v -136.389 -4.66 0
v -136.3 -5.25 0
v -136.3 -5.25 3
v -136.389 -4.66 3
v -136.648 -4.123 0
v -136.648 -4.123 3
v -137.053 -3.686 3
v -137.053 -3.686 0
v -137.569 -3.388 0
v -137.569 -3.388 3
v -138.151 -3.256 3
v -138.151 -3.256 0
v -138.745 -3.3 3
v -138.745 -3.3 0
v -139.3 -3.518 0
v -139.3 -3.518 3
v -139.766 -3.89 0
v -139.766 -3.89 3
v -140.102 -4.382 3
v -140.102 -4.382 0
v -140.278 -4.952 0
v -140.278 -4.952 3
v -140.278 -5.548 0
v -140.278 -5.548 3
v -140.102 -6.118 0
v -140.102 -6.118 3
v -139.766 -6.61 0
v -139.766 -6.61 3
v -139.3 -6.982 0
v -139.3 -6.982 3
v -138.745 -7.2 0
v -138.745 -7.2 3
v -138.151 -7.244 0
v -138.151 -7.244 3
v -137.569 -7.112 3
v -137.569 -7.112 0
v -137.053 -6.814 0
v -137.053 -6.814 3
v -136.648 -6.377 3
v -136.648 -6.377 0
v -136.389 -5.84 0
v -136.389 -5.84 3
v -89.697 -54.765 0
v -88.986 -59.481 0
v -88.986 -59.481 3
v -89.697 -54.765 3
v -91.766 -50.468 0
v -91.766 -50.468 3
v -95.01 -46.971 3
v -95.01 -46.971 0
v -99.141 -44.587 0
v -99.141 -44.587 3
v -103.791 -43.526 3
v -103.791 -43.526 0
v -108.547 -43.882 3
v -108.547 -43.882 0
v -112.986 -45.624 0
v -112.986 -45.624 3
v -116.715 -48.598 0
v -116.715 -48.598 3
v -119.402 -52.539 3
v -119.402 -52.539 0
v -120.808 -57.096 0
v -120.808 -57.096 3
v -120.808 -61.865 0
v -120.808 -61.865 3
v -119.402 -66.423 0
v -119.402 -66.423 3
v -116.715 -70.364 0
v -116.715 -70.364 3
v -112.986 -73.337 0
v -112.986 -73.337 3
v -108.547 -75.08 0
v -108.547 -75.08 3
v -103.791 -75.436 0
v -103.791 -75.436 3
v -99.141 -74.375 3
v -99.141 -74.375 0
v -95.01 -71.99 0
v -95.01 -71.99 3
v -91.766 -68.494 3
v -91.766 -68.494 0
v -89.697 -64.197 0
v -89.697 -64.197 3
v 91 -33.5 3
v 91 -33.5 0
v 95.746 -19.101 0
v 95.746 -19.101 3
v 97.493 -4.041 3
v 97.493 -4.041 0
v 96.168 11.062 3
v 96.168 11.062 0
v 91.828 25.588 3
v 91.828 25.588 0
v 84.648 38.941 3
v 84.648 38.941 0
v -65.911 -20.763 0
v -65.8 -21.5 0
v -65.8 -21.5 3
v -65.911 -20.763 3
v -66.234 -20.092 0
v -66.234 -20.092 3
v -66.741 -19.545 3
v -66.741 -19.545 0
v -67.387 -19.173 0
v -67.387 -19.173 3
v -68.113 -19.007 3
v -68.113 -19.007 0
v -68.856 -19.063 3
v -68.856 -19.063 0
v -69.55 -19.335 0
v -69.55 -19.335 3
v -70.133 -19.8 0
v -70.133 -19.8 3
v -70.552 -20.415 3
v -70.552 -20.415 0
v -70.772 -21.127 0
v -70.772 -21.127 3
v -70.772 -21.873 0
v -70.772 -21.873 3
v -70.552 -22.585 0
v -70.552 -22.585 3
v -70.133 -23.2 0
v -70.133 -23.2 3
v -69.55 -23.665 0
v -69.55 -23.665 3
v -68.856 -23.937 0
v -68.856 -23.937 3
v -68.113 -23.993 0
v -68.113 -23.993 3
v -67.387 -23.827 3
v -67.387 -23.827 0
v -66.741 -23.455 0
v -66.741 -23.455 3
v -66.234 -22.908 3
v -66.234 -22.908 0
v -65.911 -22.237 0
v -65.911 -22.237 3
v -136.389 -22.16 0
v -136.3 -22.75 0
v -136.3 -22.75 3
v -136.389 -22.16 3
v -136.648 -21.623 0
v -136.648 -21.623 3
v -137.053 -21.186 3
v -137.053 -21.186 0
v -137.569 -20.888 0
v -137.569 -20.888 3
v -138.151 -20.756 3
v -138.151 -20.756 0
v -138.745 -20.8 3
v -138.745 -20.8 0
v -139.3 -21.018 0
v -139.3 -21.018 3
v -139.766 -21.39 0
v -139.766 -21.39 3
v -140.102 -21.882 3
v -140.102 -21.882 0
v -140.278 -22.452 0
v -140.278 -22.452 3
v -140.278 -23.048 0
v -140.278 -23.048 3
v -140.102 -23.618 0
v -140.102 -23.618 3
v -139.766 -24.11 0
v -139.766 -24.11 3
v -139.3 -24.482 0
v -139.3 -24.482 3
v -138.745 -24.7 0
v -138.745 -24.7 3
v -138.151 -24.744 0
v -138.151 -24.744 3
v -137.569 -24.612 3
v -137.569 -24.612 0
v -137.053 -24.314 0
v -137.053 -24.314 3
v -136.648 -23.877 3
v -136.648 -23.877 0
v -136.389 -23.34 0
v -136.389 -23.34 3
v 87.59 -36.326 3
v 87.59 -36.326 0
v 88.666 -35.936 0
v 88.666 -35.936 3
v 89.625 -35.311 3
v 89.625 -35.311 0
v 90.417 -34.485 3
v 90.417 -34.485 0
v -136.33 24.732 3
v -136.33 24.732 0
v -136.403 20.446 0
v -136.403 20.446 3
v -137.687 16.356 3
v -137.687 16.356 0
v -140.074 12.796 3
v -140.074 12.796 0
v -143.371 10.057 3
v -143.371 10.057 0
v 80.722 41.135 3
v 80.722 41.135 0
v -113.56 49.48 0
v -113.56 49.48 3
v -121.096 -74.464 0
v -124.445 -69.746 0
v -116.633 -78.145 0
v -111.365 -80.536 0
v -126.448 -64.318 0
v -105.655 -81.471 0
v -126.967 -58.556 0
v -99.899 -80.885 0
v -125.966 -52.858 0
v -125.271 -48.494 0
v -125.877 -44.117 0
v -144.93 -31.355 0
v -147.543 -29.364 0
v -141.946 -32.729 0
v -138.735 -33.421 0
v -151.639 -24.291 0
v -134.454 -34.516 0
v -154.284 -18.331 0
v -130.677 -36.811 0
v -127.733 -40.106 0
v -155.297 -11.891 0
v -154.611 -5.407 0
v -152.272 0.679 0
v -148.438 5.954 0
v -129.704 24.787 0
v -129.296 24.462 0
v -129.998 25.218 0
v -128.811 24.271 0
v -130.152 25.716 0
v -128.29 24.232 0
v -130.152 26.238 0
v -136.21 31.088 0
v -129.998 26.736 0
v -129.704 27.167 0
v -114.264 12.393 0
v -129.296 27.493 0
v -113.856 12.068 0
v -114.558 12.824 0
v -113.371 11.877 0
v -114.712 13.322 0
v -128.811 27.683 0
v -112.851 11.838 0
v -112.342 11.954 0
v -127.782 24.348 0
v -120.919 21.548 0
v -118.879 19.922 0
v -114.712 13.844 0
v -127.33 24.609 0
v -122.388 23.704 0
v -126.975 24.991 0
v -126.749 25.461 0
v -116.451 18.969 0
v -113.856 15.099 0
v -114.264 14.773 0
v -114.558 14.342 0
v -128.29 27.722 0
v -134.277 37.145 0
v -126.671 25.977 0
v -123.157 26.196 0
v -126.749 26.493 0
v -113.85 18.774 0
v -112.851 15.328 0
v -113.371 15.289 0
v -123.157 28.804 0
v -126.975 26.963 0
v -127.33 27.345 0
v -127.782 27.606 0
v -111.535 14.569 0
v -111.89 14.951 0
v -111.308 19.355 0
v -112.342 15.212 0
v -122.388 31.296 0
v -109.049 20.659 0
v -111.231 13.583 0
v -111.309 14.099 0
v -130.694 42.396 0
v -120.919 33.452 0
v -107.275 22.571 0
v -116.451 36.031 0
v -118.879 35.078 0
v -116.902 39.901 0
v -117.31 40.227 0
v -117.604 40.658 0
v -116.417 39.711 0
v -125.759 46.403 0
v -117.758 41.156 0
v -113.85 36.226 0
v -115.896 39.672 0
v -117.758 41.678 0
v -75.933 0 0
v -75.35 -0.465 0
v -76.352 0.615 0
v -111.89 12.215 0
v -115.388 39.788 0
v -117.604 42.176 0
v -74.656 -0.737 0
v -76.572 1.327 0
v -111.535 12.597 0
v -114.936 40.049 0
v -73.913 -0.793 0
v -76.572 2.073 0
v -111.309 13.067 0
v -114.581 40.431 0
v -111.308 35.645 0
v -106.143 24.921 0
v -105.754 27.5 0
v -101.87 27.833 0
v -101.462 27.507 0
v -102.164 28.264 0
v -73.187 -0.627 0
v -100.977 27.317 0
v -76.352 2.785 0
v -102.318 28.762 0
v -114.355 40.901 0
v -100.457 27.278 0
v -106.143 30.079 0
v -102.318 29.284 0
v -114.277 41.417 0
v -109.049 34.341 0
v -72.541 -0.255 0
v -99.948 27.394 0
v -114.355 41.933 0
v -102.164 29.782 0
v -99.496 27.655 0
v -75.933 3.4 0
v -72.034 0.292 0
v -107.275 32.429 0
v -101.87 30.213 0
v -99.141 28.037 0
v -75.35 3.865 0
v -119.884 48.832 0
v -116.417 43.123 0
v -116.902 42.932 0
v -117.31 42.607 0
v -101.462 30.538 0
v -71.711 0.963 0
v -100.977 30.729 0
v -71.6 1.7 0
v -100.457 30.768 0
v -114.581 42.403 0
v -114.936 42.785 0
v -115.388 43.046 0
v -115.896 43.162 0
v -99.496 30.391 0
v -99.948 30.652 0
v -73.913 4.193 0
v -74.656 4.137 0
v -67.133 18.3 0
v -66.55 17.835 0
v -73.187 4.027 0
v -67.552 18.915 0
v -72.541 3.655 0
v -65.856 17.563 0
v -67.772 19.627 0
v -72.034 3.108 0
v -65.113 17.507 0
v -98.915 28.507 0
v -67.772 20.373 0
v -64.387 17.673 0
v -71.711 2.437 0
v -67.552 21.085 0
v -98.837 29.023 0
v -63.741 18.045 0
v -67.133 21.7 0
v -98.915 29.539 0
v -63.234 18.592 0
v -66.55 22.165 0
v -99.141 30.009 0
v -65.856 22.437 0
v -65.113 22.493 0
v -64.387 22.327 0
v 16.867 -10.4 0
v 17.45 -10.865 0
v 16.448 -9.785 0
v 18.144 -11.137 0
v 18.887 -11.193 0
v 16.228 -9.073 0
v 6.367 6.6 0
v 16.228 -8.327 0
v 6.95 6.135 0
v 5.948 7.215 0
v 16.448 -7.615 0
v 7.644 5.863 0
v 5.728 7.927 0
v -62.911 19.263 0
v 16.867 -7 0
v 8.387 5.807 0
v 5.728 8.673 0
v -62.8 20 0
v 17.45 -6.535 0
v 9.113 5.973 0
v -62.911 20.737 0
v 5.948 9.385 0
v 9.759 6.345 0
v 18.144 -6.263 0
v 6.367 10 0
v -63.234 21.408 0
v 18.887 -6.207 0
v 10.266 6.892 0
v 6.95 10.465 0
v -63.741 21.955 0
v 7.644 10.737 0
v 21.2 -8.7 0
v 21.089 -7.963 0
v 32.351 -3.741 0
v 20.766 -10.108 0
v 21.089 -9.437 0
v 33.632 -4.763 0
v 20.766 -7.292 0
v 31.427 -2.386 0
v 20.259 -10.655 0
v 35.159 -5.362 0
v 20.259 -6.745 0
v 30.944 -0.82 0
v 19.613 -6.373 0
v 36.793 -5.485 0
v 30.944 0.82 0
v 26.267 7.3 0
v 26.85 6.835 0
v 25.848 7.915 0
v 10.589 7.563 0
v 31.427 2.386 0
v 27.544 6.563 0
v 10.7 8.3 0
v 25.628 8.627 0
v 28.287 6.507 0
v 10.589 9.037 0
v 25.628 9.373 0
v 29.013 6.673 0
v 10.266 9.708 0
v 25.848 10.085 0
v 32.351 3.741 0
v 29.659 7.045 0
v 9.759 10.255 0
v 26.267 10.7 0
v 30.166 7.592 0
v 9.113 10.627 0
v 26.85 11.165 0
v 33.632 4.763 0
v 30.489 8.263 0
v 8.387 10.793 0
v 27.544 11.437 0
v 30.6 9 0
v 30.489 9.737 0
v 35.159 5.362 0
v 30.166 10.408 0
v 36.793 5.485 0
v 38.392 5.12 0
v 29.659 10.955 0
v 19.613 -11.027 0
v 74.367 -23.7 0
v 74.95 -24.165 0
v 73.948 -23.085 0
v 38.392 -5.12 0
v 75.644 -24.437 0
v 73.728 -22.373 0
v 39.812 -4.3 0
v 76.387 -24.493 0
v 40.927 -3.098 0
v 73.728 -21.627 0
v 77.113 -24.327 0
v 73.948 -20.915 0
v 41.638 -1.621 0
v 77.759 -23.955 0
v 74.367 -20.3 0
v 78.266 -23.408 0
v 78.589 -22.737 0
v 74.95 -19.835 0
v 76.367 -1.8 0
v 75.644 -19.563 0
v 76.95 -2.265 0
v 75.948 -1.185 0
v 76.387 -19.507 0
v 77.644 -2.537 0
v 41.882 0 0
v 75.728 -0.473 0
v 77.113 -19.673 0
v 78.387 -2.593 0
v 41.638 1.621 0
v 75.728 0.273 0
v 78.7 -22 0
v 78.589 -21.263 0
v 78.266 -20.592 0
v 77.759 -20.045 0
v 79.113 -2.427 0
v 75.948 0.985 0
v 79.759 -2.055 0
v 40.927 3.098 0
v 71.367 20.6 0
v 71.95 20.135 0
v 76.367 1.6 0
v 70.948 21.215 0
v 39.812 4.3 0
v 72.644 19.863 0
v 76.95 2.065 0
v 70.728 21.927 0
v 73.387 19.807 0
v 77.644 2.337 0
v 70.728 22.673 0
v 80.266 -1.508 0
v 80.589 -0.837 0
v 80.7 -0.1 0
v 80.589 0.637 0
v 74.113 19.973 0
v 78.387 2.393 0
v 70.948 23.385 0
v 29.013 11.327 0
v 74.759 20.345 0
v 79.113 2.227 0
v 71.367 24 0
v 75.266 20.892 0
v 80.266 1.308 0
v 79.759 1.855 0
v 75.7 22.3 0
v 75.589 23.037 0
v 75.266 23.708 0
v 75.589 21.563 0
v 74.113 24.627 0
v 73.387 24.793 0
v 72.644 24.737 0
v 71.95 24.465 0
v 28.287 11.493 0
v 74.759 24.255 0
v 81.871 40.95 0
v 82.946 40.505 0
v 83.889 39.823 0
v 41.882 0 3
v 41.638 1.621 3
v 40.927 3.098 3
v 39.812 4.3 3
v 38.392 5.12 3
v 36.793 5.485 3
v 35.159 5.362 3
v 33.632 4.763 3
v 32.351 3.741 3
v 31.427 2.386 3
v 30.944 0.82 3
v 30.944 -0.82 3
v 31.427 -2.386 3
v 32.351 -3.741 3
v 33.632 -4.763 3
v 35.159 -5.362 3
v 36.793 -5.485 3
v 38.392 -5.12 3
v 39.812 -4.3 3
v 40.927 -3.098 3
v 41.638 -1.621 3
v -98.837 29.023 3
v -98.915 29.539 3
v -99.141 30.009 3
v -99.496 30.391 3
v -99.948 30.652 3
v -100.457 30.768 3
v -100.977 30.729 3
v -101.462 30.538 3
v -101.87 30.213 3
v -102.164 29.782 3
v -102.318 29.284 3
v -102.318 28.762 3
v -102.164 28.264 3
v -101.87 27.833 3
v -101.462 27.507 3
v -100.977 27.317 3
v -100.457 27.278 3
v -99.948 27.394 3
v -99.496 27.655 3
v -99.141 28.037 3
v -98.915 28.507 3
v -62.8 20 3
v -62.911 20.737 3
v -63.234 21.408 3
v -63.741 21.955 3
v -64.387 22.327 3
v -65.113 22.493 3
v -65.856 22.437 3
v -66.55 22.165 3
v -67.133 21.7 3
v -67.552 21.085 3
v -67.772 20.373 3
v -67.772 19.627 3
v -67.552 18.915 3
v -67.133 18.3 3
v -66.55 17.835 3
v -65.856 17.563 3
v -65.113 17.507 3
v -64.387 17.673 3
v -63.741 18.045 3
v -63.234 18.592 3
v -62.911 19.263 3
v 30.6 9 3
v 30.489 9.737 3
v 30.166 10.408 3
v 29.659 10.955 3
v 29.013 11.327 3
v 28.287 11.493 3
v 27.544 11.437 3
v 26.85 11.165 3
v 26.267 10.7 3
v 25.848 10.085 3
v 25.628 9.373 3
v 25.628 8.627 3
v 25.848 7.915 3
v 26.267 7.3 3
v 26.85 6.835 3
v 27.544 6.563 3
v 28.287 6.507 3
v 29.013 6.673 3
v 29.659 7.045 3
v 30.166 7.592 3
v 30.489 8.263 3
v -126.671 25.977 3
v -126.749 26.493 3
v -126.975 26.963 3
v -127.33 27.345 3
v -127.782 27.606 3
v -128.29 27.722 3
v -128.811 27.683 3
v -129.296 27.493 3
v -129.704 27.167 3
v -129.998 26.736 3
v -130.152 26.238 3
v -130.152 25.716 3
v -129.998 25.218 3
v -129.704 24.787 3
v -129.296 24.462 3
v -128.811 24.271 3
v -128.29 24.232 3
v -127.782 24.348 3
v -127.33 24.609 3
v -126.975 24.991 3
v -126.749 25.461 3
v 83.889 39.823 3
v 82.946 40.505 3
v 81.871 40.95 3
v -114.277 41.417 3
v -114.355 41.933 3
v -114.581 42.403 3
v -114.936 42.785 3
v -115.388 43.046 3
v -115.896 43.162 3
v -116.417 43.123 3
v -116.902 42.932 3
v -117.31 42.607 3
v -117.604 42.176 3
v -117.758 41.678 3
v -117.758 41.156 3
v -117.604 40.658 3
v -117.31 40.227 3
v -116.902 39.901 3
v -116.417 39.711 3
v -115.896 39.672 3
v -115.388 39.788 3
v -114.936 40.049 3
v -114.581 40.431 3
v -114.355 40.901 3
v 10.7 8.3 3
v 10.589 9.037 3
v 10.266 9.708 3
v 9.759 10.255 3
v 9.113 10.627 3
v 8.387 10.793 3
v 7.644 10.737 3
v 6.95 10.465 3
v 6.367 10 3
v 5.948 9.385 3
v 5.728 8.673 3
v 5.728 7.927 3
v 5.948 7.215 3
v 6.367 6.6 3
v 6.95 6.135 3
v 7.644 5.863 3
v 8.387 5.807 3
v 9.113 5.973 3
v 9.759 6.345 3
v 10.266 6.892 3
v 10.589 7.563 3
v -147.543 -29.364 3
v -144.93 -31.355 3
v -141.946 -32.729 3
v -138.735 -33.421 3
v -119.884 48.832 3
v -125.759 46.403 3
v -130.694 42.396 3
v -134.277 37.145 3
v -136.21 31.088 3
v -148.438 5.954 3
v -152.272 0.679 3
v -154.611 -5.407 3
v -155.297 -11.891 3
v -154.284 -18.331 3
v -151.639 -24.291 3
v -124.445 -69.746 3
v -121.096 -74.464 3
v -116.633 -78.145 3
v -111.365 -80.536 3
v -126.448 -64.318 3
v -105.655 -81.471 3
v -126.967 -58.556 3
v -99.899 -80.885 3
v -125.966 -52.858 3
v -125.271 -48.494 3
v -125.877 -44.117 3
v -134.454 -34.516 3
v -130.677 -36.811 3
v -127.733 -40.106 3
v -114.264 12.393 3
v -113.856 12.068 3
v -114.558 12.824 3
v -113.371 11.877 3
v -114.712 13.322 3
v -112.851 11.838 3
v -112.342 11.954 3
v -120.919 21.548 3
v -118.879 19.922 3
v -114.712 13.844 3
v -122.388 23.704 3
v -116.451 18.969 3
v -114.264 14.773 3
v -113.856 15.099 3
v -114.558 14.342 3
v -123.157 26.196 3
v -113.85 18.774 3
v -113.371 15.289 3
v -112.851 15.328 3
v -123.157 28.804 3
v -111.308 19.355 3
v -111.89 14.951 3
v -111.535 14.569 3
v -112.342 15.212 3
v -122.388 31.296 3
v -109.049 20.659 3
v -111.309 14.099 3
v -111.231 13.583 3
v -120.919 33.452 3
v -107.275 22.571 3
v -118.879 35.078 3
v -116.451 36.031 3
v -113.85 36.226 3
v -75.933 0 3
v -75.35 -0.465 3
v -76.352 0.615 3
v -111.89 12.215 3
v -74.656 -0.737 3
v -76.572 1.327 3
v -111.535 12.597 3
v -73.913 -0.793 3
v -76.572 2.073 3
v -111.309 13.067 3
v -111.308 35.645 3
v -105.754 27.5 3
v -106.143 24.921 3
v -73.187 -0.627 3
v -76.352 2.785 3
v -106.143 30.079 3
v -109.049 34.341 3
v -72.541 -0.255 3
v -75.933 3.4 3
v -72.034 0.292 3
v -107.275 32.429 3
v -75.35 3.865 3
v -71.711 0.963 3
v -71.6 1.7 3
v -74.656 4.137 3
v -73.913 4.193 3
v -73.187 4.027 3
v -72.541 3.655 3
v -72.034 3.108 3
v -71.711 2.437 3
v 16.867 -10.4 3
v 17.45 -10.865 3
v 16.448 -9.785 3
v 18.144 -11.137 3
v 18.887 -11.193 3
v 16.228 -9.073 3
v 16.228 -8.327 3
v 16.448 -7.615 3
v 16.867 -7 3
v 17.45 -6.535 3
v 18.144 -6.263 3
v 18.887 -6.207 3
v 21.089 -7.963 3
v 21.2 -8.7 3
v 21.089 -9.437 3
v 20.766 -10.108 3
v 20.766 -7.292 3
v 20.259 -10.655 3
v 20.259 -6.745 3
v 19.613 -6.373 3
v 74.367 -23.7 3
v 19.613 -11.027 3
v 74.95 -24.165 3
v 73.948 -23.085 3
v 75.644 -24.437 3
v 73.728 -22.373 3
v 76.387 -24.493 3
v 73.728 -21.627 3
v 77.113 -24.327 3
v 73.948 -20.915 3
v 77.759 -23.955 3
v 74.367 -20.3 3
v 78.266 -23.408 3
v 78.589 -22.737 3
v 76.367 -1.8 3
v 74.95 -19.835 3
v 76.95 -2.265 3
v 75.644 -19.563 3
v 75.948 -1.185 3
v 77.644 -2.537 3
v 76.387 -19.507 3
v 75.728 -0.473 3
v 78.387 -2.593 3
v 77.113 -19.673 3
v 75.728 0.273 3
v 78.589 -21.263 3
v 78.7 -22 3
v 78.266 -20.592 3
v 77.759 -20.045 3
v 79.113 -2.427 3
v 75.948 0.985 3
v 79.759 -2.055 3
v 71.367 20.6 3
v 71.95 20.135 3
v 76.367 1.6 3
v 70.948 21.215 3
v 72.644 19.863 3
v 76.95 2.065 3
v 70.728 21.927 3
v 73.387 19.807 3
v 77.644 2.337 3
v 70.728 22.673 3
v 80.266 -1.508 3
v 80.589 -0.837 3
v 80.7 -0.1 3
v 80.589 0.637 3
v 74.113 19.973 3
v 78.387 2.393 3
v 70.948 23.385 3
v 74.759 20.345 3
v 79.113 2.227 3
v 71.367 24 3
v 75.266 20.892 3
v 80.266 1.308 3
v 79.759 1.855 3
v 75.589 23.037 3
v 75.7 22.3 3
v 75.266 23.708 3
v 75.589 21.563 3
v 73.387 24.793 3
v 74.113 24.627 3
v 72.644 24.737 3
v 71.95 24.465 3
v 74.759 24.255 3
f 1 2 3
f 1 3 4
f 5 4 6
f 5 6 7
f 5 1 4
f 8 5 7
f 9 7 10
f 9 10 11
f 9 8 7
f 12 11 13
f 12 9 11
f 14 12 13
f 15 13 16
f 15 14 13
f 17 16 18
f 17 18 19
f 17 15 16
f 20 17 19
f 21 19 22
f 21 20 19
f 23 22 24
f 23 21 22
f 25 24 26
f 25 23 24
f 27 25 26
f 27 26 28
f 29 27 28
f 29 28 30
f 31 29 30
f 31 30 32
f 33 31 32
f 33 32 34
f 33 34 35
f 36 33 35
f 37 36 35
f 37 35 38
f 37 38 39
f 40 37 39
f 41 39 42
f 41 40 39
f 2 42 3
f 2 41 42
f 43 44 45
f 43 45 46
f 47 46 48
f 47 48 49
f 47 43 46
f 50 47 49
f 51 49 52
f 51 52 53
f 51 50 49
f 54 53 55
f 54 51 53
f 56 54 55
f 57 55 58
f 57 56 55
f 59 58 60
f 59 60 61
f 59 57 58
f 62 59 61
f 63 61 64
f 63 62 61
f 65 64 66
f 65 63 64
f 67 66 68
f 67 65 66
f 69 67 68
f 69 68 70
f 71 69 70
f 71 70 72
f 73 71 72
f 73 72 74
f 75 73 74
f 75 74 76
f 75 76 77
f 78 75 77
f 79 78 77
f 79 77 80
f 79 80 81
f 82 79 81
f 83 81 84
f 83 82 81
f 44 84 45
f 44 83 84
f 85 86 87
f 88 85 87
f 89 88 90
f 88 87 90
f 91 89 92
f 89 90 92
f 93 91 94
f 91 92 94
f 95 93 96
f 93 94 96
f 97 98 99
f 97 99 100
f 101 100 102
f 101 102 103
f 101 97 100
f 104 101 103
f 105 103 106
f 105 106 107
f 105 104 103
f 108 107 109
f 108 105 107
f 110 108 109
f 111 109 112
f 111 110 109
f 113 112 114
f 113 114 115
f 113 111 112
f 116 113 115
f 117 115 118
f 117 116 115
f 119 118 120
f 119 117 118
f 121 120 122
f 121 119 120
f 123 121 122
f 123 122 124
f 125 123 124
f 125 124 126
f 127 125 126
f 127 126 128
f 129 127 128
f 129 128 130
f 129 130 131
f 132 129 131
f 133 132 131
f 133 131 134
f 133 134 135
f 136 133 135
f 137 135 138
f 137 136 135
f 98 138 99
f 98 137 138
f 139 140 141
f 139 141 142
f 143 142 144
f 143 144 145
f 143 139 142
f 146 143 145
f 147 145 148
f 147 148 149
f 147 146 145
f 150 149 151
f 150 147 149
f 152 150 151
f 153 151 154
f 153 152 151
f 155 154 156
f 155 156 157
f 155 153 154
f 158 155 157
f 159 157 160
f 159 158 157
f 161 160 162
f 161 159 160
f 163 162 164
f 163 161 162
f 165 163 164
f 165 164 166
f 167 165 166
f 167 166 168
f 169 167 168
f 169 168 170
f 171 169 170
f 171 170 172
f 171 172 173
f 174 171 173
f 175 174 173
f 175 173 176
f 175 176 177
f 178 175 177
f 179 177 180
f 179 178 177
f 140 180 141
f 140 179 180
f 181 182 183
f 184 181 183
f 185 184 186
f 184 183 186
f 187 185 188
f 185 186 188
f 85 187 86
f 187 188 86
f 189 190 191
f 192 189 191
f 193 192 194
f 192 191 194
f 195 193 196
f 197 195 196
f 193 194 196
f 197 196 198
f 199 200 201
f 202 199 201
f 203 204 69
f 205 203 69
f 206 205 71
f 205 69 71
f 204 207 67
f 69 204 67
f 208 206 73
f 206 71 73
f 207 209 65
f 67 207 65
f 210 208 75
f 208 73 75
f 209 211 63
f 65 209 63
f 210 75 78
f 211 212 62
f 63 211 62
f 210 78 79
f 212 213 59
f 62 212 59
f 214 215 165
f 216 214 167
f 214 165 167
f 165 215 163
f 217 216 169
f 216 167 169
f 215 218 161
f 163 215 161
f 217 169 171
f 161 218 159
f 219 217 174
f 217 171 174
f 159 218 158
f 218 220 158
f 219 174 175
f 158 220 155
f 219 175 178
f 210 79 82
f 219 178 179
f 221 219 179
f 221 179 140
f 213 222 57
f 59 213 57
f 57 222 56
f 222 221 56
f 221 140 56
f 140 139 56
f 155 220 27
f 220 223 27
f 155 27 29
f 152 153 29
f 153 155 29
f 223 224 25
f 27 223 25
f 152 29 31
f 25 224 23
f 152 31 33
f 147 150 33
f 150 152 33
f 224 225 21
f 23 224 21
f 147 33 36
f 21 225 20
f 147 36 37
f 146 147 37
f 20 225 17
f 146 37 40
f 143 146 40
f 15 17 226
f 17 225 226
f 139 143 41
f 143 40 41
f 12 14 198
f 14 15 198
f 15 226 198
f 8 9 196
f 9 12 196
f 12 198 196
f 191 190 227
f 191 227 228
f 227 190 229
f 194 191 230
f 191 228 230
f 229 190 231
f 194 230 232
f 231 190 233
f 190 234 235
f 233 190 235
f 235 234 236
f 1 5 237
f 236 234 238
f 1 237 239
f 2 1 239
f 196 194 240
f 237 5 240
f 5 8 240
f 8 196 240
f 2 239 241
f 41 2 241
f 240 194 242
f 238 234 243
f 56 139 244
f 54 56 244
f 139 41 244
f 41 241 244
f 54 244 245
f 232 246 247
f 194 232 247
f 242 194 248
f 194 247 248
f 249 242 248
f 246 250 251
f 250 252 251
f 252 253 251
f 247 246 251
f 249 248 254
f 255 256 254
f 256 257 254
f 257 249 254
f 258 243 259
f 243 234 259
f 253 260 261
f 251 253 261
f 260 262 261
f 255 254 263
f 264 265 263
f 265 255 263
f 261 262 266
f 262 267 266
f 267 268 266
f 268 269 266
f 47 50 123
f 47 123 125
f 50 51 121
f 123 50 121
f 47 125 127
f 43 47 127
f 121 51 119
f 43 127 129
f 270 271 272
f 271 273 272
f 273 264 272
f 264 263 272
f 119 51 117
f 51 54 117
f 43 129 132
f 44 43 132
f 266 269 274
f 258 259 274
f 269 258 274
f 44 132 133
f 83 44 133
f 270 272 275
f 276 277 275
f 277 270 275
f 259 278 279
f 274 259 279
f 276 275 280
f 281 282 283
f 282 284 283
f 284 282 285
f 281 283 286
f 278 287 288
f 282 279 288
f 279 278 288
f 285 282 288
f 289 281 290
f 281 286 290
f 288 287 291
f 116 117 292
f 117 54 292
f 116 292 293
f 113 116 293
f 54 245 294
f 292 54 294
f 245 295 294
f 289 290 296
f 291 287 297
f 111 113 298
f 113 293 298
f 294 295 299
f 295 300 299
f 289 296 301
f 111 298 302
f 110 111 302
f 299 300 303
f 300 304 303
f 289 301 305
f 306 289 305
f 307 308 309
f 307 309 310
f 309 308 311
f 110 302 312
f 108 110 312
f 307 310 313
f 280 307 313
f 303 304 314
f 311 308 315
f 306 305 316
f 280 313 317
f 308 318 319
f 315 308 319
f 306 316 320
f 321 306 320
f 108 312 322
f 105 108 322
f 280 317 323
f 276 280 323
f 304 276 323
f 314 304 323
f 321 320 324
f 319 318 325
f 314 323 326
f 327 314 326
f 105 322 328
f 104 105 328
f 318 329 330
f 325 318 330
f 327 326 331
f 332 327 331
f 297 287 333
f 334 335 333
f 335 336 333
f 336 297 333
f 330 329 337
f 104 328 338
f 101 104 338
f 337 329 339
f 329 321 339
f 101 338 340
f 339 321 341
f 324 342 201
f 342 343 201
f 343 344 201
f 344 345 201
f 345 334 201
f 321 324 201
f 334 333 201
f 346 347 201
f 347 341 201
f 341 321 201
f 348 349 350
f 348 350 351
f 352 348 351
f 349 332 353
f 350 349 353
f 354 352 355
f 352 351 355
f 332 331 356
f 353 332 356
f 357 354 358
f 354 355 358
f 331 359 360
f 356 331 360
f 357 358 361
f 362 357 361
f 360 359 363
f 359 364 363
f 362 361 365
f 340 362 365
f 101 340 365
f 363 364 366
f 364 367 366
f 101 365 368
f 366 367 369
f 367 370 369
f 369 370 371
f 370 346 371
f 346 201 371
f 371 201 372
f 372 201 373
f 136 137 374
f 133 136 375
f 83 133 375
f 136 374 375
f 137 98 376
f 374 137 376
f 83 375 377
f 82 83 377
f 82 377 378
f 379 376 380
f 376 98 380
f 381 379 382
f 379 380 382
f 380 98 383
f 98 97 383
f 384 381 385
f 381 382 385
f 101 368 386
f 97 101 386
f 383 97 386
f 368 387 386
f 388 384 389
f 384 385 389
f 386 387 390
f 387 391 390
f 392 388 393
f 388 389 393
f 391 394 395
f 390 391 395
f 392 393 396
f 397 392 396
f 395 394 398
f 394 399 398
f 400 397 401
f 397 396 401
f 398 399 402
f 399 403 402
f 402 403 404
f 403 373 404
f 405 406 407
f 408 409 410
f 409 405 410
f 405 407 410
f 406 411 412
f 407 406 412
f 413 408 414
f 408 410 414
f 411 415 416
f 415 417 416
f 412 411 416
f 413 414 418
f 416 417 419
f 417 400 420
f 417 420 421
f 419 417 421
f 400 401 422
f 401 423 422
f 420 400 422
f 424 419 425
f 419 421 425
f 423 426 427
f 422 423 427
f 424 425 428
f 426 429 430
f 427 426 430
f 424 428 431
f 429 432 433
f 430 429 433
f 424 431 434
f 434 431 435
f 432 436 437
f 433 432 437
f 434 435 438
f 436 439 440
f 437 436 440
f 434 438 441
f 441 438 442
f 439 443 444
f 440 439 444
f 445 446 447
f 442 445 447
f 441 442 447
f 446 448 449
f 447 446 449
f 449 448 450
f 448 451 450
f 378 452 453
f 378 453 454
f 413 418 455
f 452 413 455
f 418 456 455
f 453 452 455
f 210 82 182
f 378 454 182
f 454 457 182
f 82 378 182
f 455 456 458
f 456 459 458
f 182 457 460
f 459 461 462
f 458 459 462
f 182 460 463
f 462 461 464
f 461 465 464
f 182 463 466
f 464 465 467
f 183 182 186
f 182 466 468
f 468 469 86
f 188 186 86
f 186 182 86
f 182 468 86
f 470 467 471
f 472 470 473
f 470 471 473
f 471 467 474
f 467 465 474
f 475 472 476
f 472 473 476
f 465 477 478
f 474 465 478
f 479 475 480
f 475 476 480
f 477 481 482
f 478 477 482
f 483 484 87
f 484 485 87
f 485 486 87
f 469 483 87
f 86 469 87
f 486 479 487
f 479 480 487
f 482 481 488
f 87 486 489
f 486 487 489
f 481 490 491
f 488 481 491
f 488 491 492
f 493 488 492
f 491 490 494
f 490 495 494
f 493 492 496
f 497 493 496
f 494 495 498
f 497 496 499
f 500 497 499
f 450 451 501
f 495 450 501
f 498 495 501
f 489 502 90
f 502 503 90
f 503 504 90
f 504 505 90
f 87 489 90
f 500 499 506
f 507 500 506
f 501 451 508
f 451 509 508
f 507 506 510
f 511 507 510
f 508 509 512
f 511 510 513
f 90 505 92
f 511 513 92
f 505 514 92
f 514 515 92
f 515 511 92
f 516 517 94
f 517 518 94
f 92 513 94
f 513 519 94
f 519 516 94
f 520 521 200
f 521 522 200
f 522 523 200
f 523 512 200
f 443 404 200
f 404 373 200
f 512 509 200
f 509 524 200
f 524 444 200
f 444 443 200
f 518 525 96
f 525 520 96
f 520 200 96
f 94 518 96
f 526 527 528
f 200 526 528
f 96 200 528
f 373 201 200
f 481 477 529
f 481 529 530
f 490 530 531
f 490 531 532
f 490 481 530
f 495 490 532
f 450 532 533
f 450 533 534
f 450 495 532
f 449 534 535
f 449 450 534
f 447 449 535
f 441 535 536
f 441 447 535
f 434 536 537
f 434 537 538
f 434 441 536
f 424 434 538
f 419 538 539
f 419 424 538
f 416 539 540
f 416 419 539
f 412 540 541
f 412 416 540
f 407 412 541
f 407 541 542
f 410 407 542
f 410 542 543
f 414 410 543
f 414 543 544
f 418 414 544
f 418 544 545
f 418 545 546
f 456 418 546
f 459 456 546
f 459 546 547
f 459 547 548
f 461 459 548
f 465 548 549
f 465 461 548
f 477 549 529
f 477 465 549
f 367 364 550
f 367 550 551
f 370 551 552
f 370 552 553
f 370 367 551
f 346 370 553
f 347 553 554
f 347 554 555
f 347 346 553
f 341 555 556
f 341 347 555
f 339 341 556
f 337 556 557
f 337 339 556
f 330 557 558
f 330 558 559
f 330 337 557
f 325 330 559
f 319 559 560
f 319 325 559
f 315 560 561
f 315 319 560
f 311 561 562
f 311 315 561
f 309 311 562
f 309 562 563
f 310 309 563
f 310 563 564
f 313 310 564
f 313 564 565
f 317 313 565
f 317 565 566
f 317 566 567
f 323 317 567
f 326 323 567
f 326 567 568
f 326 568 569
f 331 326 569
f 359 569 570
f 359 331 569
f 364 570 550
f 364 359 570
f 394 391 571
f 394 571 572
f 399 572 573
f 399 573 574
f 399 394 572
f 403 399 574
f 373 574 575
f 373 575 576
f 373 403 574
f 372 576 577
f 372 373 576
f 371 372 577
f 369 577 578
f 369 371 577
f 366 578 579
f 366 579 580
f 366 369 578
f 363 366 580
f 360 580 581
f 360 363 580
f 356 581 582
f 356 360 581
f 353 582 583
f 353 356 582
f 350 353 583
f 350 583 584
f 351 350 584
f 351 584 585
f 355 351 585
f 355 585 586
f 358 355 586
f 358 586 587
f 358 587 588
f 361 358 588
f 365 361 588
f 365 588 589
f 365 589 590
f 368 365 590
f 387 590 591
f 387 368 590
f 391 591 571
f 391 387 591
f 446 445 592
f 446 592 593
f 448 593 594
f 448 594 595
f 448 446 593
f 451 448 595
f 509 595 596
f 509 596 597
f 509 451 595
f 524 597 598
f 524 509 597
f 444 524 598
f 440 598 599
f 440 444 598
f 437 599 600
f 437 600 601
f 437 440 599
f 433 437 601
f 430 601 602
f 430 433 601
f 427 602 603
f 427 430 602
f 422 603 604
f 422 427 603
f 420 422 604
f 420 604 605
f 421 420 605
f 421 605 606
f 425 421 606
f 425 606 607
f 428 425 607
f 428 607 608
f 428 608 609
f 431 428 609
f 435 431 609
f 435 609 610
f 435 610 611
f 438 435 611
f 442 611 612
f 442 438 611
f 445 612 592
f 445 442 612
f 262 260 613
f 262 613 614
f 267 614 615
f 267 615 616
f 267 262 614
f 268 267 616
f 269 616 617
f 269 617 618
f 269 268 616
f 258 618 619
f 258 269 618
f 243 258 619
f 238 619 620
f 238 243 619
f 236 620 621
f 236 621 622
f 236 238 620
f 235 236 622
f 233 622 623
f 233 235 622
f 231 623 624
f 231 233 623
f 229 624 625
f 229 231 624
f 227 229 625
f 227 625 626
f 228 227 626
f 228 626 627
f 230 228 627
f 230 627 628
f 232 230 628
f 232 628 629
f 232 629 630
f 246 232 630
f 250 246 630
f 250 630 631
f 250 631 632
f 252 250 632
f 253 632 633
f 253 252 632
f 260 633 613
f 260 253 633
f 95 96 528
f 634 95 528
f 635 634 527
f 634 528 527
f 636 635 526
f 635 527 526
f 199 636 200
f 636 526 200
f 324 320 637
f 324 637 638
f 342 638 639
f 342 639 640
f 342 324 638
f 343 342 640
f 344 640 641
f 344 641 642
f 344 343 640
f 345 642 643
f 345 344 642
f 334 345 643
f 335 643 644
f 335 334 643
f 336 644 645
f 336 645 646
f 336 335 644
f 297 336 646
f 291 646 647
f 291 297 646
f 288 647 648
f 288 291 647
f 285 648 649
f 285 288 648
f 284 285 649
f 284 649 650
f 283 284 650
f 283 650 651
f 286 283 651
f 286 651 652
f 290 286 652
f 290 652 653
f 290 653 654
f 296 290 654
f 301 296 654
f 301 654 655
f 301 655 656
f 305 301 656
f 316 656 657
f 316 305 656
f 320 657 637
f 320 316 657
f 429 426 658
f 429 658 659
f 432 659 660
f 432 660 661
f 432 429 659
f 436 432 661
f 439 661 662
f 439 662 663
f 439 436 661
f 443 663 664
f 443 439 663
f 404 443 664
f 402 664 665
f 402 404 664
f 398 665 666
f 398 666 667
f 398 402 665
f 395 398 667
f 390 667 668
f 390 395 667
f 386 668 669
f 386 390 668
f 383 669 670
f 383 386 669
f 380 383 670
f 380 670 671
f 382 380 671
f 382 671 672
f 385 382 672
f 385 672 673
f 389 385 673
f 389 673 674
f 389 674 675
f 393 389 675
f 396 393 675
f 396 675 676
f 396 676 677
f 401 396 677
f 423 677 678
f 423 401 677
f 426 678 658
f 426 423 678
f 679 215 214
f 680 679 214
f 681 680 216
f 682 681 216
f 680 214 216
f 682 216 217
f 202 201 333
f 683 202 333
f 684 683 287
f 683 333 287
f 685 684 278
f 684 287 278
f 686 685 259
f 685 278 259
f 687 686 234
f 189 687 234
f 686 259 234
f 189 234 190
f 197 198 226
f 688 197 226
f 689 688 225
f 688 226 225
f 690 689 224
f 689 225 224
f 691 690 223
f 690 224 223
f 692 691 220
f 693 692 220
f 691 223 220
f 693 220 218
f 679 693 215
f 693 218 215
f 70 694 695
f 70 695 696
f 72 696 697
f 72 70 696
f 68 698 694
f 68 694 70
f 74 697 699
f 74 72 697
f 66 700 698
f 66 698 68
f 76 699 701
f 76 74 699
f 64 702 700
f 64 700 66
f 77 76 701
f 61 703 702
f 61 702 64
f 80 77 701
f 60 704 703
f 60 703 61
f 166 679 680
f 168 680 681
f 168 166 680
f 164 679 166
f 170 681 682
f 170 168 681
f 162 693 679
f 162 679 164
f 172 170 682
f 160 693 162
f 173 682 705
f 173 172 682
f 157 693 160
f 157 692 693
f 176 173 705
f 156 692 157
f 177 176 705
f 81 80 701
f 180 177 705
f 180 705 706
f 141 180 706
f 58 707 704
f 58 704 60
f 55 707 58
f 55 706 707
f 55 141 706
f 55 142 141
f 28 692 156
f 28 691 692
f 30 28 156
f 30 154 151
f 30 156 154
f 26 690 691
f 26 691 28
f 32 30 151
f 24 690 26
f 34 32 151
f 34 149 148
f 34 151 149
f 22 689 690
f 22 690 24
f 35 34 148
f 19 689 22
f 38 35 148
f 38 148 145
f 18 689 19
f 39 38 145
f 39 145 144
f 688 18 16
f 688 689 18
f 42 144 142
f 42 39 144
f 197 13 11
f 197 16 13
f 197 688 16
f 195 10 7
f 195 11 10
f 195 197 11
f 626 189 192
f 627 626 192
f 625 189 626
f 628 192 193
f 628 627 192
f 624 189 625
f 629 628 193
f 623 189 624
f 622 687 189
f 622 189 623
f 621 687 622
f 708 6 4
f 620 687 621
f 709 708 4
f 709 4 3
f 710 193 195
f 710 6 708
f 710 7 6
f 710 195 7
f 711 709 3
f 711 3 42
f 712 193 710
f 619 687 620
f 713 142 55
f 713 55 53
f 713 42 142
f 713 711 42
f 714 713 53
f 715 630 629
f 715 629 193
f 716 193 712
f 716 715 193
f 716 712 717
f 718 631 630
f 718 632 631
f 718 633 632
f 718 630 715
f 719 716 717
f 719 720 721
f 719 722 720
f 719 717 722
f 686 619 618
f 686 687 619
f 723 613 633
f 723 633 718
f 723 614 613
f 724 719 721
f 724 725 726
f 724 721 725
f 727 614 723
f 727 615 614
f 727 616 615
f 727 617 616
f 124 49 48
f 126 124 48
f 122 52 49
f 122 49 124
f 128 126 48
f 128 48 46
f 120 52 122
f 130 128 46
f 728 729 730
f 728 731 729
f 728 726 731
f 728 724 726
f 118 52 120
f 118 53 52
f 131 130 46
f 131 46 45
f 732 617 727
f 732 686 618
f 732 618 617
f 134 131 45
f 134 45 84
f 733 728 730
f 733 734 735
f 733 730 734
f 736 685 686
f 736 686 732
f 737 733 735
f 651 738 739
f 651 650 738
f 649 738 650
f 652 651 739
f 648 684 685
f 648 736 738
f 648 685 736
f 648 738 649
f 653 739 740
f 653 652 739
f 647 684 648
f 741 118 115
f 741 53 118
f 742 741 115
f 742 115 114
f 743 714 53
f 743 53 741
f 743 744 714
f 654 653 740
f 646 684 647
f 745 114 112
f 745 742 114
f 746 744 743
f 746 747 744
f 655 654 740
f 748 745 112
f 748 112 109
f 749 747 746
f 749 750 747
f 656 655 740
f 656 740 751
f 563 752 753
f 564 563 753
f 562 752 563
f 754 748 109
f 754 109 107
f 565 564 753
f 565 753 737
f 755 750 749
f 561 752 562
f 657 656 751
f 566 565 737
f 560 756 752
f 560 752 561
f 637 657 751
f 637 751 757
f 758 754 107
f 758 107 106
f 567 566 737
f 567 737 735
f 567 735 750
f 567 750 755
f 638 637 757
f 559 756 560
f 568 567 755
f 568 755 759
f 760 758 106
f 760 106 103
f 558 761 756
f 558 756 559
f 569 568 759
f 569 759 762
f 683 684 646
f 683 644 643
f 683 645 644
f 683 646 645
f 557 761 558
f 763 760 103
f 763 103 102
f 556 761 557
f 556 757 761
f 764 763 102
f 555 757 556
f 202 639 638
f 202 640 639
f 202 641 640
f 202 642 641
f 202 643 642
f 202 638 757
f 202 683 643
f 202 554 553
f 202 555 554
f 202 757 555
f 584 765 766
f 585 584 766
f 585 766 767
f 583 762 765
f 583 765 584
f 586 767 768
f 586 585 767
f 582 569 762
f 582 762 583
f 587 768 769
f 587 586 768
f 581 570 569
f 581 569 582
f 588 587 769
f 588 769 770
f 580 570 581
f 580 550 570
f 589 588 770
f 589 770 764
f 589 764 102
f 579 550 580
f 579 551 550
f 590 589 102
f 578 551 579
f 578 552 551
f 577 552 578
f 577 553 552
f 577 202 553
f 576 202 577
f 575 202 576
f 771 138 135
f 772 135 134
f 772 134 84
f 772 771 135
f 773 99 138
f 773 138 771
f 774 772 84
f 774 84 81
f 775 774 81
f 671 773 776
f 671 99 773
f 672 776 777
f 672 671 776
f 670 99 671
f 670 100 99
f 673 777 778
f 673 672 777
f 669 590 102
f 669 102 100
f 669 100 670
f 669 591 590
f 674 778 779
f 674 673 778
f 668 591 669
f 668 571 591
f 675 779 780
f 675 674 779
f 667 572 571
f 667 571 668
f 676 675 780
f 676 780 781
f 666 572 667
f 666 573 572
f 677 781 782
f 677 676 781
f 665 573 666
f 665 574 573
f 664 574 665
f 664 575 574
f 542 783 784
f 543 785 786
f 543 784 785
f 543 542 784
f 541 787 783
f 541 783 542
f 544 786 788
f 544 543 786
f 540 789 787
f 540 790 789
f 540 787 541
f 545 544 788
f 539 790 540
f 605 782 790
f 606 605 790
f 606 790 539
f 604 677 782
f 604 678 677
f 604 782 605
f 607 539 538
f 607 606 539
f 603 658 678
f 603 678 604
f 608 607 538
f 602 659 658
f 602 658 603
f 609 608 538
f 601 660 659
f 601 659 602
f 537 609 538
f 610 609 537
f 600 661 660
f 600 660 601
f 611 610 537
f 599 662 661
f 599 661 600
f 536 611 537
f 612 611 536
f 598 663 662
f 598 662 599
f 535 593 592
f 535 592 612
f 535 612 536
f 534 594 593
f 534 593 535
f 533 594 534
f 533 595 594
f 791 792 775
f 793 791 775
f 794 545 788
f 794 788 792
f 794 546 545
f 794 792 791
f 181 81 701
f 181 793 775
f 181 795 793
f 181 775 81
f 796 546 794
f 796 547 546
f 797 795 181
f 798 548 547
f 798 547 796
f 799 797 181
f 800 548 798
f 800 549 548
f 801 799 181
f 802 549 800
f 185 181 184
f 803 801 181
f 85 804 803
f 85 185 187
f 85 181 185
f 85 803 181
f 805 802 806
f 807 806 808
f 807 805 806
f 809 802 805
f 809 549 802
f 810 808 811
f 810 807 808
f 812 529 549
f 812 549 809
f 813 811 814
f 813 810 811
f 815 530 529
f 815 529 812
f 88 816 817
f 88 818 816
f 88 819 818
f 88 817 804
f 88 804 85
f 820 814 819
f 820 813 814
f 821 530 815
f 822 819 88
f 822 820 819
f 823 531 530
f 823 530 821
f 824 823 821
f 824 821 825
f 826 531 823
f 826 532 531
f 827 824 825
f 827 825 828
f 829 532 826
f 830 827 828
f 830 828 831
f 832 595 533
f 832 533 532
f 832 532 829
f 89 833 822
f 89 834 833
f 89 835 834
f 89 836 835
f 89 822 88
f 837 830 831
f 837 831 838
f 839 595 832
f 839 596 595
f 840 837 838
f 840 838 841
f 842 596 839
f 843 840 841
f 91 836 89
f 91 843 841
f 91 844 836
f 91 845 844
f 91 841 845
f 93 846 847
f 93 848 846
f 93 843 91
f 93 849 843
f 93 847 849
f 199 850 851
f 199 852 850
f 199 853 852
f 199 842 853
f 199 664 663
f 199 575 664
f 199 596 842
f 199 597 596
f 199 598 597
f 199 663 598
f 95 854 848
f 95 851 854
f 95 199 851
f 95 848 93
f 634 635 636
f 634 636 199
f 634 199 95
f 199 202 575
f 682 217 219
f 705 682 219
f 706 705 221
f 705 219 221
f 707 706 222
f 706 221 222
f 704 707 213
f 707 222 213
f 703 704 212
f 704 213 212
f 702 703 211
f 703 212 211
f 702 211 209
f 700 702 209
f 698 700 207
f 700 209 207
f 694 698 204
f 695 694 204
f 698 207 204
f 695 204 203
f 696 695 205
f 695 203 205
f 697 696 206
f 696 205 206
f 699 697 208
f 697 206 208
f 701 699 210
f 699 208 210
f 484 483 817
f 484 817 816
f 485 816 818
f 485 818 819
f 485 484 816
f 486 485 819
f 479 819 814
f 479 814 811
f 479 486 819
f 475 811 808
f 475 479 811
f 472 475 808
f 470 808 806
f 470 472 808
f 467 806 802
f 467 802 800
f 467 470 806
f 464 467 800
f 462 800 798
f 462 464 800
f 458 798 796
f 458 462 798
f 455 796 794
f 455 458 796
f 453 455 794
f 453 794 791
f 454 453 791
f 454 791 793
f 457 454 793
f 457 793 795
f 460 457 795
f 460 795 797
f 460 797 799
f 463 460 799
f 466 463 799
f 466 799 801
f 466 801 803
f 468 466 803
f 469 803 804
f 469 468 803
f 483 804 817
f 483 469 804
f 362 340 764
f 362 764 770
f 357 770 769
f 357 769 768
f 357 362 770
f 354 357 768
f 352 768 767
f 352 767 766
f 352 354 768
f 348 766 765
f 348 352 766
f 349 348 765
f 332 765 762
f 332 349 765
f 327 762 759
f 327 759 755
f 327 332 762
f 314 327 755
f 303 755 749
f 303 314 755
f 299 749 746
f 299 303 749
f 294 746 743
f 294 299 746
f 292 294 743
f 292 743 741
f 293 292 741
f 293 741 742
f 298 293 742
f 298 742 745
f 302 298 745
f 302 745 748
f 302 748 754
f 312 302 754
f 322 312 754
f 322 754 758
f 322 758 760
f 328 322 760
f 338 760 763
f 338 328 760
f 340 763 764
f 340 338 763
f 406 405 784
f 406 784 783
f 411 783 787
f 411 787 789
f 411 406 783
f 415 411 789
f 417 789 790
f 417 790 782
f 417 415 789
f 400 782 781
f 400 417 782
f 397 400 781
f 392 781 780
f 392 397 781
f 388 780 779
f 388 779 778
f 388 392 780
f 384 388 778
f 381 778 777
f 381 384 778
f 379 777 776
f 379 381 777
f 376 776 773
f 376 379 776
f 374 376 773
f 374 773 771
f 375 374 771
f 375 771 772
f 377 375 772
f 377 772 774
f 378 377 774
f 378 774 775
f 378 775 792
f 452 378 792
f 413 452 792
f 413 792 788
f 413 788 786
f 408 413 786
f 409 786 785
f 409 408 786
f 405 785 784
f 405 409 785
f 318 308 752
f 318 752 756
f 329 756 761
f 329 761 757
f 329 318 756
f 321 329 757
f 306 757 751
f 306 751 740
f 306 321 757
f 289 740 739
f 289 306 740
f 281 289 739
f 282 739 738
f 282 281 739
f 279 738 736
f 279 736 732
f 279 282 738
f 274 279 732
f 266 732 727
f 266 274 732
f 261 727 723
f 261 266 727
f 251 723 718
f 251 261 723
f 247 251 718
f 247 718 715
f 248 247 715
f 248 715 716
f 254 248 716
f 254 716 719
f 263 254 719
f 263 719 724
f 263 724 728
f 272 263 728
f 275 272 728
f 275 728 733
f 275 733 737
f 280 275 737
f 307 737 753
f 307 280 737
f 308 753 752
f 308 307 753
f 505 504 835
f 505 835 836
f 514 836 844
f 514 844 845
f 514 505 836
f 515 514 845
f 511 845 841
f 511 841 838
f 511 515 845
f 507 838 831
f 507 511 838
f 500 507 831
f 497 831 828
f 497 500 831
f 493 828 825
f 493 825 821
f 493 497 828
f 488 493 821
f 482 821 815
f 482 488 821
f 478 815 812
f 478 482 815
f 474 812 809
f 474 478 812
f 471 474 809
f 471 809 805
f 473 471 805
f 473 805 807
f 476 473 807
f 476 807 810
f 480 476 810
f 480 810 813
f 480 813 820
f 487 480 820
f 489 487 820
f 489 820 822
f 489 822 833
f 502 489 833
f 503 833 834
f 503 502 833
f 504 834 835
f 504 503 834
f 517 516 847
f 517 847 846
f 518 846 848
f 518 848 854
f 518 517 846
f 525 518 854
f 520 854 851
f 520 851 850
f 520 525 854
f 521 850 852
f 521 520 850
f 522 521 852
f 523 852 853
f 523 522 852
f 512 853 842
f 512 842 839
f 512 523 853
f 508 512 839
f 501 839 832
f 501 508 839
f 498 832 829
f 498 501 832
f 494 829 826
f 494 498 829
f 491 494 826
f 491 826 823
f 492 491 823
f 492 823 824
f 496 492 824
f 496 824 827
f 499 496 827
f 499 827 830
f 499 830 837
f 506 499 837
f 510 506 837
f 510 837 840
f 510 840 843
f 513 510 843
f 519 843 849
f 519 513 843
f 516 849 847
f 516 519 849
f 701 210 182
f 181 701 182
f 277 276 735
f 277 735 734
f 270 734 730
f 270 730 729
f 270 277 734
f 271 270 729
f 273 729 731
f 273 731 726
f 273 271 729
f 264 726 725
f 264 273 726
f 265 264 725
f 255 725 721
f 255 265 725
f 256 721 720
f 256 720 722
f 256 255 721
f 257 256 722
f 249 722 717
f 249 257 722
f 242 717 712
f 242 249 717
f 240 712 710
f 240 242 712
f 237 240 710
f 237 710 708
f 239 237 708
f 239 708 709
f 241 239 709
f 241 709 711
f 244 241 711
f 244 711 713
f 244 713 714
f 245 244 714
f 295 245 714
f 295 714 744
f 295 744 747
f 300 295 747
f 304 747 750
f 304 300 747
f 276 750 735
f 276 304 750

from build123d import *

# Parameters (mm, degrees)
SKETCH1_R           = 2
SKETCH1_R_2         = 2.5
SKETCH1_R_3         = 5.5
SKETCH1_R_4         = 1.75
SKETCH1_R_5         = 8.75
SKETCH1_R_6         = 16
BOSS_EXTRUDE1_DEPTH = 3


with BuildPart() as part:
    # Sketch1 → Boss-Extrude1 (new body)
    with BuildSketch(Plane.XY):
        with BuildLine():
            ThreePointArc((-113.560266524, 49.479735972), (-130.694234864, 42.395842918), (-136.329525131, 24.732380193))
            ThreePointArc((-136.329525131, 24.732380193), (-137.686520221, 16.356467092), (-143.370984404, 10.056925608))
            ThreePointArc((-143.370984404, 10.056925608), (-155.166532009, -8.626129333), (-147.542861296, -29.364285714))
            ThreePointArc((-147.542861296, -29.364285714), (-143.475887893, -32.124161339), (-138.735140925, -33.421275181))
            ThreePointArc((-138.735140925, -33.421275181), (-127.733357788, -40.106373668), (-125.965715234, -52.858048609))
            ThreePointArc((-125.965715234, -52.858048609), (-121.095745986, -74.463536322), (-99.899442585, -80.88462828))
            Line((-99.899442585, -80.88462828), (87.590338172, -36.326384859))
            ThreePointArc((87.590338172, -36.326384859), (89.625170423, -35.311295666), (91, -33.5))
            ThreePointArc((91, -33.5), (97.213976906, 3.543991621), (84.648444567, 38.941424032))
            ThreePointArc((84.648444567, 38.941424032), (82.945648013, 40.504860181), (80.721588123, 41.135261877))
            Line((80.721588123, 41.135261877), (-113.560266524, 49.479735972))
        make_face()
        with Locations((-138.3, -22.75)):
            Circle(SKETCH1_R, mode=Mode.SUBTRACT)
        with Locations((-68.3, -21.5)):
            Circle(SKETCH1_R_2, mode=Mode.SUBTRACT)
        with Locations((-138.3, -5.25)):
            Circle(SKETCH1_R, mode=Mode.SUBTRACT)
        with Locations((-74.1, 1.7)):
            Circle(SKETCH1_R_2, mode=Mode.SUBTRACT)
        with Locations((18.7, -8.7)):
            Circle(SKETCH1_R_2, mode=Mode.SUBTRACT)
        with Locations((76.2, -22)):
            Circle(SKETCH1_R_2, mode=Mode.SUBTRACT)
        with Locations((8.2, 8.3)):
            Circle(SKETCH1_R_2, mode=Mode.SUBTRACT)
        with Locations((36.382449965, 0)):
            Circle(SKETCH1_R_3, mode=Mode.SUBTRACT)
        with Locations((78.2, -0.1)):
            Circle(SKETCH1_R_2, mode=Mode.SUBTRACT)
        with Locations((28.1, 9)):
            Circle(SKETCH1_R_2, mode=Mode.SUBTRACT)
        with Locations((-112.981409671, 13.583075301)):
            Circle(SKETCH1_R_4, mode=Mode.SUBTRACT)
        with Locations((-128.421228626, 25.977105744)):
            Circle(SKETCH1_R_4, mode=Mode.SUBTRACT)
        with Locations((-65.3, 20)):
            Circle(SKETCH1_R_2, mode=Mode.SUBTRACT)
        with Locations((-114.504303927, 27.5)):
            Circle(SKETCH1_R_5, mode=Mode.SUBTRACT)
        with Locations((-100.587379227, 29.022894256)):
            Circle(SKETCH1_R_4, mode=Mode.SUBTRACT)
        with Locations((-116.027198182, 41.416924699)):
            Circle(SKETCH1_R_4, mode=Mode.SUBTRACT)
        with Locations((73.2, 22.3)):
            Circle(SKETCH1_R_2, mode=Mode.SUBTRACT)
        with Locations((-104.986214828, -59.480779371)):
            Circle(SKETCH1_R_6, mode=Mode.SUBTRACT)
    extrude(amount=BOSS_EXTRUDE1_DEPTH)


solid = part.part
